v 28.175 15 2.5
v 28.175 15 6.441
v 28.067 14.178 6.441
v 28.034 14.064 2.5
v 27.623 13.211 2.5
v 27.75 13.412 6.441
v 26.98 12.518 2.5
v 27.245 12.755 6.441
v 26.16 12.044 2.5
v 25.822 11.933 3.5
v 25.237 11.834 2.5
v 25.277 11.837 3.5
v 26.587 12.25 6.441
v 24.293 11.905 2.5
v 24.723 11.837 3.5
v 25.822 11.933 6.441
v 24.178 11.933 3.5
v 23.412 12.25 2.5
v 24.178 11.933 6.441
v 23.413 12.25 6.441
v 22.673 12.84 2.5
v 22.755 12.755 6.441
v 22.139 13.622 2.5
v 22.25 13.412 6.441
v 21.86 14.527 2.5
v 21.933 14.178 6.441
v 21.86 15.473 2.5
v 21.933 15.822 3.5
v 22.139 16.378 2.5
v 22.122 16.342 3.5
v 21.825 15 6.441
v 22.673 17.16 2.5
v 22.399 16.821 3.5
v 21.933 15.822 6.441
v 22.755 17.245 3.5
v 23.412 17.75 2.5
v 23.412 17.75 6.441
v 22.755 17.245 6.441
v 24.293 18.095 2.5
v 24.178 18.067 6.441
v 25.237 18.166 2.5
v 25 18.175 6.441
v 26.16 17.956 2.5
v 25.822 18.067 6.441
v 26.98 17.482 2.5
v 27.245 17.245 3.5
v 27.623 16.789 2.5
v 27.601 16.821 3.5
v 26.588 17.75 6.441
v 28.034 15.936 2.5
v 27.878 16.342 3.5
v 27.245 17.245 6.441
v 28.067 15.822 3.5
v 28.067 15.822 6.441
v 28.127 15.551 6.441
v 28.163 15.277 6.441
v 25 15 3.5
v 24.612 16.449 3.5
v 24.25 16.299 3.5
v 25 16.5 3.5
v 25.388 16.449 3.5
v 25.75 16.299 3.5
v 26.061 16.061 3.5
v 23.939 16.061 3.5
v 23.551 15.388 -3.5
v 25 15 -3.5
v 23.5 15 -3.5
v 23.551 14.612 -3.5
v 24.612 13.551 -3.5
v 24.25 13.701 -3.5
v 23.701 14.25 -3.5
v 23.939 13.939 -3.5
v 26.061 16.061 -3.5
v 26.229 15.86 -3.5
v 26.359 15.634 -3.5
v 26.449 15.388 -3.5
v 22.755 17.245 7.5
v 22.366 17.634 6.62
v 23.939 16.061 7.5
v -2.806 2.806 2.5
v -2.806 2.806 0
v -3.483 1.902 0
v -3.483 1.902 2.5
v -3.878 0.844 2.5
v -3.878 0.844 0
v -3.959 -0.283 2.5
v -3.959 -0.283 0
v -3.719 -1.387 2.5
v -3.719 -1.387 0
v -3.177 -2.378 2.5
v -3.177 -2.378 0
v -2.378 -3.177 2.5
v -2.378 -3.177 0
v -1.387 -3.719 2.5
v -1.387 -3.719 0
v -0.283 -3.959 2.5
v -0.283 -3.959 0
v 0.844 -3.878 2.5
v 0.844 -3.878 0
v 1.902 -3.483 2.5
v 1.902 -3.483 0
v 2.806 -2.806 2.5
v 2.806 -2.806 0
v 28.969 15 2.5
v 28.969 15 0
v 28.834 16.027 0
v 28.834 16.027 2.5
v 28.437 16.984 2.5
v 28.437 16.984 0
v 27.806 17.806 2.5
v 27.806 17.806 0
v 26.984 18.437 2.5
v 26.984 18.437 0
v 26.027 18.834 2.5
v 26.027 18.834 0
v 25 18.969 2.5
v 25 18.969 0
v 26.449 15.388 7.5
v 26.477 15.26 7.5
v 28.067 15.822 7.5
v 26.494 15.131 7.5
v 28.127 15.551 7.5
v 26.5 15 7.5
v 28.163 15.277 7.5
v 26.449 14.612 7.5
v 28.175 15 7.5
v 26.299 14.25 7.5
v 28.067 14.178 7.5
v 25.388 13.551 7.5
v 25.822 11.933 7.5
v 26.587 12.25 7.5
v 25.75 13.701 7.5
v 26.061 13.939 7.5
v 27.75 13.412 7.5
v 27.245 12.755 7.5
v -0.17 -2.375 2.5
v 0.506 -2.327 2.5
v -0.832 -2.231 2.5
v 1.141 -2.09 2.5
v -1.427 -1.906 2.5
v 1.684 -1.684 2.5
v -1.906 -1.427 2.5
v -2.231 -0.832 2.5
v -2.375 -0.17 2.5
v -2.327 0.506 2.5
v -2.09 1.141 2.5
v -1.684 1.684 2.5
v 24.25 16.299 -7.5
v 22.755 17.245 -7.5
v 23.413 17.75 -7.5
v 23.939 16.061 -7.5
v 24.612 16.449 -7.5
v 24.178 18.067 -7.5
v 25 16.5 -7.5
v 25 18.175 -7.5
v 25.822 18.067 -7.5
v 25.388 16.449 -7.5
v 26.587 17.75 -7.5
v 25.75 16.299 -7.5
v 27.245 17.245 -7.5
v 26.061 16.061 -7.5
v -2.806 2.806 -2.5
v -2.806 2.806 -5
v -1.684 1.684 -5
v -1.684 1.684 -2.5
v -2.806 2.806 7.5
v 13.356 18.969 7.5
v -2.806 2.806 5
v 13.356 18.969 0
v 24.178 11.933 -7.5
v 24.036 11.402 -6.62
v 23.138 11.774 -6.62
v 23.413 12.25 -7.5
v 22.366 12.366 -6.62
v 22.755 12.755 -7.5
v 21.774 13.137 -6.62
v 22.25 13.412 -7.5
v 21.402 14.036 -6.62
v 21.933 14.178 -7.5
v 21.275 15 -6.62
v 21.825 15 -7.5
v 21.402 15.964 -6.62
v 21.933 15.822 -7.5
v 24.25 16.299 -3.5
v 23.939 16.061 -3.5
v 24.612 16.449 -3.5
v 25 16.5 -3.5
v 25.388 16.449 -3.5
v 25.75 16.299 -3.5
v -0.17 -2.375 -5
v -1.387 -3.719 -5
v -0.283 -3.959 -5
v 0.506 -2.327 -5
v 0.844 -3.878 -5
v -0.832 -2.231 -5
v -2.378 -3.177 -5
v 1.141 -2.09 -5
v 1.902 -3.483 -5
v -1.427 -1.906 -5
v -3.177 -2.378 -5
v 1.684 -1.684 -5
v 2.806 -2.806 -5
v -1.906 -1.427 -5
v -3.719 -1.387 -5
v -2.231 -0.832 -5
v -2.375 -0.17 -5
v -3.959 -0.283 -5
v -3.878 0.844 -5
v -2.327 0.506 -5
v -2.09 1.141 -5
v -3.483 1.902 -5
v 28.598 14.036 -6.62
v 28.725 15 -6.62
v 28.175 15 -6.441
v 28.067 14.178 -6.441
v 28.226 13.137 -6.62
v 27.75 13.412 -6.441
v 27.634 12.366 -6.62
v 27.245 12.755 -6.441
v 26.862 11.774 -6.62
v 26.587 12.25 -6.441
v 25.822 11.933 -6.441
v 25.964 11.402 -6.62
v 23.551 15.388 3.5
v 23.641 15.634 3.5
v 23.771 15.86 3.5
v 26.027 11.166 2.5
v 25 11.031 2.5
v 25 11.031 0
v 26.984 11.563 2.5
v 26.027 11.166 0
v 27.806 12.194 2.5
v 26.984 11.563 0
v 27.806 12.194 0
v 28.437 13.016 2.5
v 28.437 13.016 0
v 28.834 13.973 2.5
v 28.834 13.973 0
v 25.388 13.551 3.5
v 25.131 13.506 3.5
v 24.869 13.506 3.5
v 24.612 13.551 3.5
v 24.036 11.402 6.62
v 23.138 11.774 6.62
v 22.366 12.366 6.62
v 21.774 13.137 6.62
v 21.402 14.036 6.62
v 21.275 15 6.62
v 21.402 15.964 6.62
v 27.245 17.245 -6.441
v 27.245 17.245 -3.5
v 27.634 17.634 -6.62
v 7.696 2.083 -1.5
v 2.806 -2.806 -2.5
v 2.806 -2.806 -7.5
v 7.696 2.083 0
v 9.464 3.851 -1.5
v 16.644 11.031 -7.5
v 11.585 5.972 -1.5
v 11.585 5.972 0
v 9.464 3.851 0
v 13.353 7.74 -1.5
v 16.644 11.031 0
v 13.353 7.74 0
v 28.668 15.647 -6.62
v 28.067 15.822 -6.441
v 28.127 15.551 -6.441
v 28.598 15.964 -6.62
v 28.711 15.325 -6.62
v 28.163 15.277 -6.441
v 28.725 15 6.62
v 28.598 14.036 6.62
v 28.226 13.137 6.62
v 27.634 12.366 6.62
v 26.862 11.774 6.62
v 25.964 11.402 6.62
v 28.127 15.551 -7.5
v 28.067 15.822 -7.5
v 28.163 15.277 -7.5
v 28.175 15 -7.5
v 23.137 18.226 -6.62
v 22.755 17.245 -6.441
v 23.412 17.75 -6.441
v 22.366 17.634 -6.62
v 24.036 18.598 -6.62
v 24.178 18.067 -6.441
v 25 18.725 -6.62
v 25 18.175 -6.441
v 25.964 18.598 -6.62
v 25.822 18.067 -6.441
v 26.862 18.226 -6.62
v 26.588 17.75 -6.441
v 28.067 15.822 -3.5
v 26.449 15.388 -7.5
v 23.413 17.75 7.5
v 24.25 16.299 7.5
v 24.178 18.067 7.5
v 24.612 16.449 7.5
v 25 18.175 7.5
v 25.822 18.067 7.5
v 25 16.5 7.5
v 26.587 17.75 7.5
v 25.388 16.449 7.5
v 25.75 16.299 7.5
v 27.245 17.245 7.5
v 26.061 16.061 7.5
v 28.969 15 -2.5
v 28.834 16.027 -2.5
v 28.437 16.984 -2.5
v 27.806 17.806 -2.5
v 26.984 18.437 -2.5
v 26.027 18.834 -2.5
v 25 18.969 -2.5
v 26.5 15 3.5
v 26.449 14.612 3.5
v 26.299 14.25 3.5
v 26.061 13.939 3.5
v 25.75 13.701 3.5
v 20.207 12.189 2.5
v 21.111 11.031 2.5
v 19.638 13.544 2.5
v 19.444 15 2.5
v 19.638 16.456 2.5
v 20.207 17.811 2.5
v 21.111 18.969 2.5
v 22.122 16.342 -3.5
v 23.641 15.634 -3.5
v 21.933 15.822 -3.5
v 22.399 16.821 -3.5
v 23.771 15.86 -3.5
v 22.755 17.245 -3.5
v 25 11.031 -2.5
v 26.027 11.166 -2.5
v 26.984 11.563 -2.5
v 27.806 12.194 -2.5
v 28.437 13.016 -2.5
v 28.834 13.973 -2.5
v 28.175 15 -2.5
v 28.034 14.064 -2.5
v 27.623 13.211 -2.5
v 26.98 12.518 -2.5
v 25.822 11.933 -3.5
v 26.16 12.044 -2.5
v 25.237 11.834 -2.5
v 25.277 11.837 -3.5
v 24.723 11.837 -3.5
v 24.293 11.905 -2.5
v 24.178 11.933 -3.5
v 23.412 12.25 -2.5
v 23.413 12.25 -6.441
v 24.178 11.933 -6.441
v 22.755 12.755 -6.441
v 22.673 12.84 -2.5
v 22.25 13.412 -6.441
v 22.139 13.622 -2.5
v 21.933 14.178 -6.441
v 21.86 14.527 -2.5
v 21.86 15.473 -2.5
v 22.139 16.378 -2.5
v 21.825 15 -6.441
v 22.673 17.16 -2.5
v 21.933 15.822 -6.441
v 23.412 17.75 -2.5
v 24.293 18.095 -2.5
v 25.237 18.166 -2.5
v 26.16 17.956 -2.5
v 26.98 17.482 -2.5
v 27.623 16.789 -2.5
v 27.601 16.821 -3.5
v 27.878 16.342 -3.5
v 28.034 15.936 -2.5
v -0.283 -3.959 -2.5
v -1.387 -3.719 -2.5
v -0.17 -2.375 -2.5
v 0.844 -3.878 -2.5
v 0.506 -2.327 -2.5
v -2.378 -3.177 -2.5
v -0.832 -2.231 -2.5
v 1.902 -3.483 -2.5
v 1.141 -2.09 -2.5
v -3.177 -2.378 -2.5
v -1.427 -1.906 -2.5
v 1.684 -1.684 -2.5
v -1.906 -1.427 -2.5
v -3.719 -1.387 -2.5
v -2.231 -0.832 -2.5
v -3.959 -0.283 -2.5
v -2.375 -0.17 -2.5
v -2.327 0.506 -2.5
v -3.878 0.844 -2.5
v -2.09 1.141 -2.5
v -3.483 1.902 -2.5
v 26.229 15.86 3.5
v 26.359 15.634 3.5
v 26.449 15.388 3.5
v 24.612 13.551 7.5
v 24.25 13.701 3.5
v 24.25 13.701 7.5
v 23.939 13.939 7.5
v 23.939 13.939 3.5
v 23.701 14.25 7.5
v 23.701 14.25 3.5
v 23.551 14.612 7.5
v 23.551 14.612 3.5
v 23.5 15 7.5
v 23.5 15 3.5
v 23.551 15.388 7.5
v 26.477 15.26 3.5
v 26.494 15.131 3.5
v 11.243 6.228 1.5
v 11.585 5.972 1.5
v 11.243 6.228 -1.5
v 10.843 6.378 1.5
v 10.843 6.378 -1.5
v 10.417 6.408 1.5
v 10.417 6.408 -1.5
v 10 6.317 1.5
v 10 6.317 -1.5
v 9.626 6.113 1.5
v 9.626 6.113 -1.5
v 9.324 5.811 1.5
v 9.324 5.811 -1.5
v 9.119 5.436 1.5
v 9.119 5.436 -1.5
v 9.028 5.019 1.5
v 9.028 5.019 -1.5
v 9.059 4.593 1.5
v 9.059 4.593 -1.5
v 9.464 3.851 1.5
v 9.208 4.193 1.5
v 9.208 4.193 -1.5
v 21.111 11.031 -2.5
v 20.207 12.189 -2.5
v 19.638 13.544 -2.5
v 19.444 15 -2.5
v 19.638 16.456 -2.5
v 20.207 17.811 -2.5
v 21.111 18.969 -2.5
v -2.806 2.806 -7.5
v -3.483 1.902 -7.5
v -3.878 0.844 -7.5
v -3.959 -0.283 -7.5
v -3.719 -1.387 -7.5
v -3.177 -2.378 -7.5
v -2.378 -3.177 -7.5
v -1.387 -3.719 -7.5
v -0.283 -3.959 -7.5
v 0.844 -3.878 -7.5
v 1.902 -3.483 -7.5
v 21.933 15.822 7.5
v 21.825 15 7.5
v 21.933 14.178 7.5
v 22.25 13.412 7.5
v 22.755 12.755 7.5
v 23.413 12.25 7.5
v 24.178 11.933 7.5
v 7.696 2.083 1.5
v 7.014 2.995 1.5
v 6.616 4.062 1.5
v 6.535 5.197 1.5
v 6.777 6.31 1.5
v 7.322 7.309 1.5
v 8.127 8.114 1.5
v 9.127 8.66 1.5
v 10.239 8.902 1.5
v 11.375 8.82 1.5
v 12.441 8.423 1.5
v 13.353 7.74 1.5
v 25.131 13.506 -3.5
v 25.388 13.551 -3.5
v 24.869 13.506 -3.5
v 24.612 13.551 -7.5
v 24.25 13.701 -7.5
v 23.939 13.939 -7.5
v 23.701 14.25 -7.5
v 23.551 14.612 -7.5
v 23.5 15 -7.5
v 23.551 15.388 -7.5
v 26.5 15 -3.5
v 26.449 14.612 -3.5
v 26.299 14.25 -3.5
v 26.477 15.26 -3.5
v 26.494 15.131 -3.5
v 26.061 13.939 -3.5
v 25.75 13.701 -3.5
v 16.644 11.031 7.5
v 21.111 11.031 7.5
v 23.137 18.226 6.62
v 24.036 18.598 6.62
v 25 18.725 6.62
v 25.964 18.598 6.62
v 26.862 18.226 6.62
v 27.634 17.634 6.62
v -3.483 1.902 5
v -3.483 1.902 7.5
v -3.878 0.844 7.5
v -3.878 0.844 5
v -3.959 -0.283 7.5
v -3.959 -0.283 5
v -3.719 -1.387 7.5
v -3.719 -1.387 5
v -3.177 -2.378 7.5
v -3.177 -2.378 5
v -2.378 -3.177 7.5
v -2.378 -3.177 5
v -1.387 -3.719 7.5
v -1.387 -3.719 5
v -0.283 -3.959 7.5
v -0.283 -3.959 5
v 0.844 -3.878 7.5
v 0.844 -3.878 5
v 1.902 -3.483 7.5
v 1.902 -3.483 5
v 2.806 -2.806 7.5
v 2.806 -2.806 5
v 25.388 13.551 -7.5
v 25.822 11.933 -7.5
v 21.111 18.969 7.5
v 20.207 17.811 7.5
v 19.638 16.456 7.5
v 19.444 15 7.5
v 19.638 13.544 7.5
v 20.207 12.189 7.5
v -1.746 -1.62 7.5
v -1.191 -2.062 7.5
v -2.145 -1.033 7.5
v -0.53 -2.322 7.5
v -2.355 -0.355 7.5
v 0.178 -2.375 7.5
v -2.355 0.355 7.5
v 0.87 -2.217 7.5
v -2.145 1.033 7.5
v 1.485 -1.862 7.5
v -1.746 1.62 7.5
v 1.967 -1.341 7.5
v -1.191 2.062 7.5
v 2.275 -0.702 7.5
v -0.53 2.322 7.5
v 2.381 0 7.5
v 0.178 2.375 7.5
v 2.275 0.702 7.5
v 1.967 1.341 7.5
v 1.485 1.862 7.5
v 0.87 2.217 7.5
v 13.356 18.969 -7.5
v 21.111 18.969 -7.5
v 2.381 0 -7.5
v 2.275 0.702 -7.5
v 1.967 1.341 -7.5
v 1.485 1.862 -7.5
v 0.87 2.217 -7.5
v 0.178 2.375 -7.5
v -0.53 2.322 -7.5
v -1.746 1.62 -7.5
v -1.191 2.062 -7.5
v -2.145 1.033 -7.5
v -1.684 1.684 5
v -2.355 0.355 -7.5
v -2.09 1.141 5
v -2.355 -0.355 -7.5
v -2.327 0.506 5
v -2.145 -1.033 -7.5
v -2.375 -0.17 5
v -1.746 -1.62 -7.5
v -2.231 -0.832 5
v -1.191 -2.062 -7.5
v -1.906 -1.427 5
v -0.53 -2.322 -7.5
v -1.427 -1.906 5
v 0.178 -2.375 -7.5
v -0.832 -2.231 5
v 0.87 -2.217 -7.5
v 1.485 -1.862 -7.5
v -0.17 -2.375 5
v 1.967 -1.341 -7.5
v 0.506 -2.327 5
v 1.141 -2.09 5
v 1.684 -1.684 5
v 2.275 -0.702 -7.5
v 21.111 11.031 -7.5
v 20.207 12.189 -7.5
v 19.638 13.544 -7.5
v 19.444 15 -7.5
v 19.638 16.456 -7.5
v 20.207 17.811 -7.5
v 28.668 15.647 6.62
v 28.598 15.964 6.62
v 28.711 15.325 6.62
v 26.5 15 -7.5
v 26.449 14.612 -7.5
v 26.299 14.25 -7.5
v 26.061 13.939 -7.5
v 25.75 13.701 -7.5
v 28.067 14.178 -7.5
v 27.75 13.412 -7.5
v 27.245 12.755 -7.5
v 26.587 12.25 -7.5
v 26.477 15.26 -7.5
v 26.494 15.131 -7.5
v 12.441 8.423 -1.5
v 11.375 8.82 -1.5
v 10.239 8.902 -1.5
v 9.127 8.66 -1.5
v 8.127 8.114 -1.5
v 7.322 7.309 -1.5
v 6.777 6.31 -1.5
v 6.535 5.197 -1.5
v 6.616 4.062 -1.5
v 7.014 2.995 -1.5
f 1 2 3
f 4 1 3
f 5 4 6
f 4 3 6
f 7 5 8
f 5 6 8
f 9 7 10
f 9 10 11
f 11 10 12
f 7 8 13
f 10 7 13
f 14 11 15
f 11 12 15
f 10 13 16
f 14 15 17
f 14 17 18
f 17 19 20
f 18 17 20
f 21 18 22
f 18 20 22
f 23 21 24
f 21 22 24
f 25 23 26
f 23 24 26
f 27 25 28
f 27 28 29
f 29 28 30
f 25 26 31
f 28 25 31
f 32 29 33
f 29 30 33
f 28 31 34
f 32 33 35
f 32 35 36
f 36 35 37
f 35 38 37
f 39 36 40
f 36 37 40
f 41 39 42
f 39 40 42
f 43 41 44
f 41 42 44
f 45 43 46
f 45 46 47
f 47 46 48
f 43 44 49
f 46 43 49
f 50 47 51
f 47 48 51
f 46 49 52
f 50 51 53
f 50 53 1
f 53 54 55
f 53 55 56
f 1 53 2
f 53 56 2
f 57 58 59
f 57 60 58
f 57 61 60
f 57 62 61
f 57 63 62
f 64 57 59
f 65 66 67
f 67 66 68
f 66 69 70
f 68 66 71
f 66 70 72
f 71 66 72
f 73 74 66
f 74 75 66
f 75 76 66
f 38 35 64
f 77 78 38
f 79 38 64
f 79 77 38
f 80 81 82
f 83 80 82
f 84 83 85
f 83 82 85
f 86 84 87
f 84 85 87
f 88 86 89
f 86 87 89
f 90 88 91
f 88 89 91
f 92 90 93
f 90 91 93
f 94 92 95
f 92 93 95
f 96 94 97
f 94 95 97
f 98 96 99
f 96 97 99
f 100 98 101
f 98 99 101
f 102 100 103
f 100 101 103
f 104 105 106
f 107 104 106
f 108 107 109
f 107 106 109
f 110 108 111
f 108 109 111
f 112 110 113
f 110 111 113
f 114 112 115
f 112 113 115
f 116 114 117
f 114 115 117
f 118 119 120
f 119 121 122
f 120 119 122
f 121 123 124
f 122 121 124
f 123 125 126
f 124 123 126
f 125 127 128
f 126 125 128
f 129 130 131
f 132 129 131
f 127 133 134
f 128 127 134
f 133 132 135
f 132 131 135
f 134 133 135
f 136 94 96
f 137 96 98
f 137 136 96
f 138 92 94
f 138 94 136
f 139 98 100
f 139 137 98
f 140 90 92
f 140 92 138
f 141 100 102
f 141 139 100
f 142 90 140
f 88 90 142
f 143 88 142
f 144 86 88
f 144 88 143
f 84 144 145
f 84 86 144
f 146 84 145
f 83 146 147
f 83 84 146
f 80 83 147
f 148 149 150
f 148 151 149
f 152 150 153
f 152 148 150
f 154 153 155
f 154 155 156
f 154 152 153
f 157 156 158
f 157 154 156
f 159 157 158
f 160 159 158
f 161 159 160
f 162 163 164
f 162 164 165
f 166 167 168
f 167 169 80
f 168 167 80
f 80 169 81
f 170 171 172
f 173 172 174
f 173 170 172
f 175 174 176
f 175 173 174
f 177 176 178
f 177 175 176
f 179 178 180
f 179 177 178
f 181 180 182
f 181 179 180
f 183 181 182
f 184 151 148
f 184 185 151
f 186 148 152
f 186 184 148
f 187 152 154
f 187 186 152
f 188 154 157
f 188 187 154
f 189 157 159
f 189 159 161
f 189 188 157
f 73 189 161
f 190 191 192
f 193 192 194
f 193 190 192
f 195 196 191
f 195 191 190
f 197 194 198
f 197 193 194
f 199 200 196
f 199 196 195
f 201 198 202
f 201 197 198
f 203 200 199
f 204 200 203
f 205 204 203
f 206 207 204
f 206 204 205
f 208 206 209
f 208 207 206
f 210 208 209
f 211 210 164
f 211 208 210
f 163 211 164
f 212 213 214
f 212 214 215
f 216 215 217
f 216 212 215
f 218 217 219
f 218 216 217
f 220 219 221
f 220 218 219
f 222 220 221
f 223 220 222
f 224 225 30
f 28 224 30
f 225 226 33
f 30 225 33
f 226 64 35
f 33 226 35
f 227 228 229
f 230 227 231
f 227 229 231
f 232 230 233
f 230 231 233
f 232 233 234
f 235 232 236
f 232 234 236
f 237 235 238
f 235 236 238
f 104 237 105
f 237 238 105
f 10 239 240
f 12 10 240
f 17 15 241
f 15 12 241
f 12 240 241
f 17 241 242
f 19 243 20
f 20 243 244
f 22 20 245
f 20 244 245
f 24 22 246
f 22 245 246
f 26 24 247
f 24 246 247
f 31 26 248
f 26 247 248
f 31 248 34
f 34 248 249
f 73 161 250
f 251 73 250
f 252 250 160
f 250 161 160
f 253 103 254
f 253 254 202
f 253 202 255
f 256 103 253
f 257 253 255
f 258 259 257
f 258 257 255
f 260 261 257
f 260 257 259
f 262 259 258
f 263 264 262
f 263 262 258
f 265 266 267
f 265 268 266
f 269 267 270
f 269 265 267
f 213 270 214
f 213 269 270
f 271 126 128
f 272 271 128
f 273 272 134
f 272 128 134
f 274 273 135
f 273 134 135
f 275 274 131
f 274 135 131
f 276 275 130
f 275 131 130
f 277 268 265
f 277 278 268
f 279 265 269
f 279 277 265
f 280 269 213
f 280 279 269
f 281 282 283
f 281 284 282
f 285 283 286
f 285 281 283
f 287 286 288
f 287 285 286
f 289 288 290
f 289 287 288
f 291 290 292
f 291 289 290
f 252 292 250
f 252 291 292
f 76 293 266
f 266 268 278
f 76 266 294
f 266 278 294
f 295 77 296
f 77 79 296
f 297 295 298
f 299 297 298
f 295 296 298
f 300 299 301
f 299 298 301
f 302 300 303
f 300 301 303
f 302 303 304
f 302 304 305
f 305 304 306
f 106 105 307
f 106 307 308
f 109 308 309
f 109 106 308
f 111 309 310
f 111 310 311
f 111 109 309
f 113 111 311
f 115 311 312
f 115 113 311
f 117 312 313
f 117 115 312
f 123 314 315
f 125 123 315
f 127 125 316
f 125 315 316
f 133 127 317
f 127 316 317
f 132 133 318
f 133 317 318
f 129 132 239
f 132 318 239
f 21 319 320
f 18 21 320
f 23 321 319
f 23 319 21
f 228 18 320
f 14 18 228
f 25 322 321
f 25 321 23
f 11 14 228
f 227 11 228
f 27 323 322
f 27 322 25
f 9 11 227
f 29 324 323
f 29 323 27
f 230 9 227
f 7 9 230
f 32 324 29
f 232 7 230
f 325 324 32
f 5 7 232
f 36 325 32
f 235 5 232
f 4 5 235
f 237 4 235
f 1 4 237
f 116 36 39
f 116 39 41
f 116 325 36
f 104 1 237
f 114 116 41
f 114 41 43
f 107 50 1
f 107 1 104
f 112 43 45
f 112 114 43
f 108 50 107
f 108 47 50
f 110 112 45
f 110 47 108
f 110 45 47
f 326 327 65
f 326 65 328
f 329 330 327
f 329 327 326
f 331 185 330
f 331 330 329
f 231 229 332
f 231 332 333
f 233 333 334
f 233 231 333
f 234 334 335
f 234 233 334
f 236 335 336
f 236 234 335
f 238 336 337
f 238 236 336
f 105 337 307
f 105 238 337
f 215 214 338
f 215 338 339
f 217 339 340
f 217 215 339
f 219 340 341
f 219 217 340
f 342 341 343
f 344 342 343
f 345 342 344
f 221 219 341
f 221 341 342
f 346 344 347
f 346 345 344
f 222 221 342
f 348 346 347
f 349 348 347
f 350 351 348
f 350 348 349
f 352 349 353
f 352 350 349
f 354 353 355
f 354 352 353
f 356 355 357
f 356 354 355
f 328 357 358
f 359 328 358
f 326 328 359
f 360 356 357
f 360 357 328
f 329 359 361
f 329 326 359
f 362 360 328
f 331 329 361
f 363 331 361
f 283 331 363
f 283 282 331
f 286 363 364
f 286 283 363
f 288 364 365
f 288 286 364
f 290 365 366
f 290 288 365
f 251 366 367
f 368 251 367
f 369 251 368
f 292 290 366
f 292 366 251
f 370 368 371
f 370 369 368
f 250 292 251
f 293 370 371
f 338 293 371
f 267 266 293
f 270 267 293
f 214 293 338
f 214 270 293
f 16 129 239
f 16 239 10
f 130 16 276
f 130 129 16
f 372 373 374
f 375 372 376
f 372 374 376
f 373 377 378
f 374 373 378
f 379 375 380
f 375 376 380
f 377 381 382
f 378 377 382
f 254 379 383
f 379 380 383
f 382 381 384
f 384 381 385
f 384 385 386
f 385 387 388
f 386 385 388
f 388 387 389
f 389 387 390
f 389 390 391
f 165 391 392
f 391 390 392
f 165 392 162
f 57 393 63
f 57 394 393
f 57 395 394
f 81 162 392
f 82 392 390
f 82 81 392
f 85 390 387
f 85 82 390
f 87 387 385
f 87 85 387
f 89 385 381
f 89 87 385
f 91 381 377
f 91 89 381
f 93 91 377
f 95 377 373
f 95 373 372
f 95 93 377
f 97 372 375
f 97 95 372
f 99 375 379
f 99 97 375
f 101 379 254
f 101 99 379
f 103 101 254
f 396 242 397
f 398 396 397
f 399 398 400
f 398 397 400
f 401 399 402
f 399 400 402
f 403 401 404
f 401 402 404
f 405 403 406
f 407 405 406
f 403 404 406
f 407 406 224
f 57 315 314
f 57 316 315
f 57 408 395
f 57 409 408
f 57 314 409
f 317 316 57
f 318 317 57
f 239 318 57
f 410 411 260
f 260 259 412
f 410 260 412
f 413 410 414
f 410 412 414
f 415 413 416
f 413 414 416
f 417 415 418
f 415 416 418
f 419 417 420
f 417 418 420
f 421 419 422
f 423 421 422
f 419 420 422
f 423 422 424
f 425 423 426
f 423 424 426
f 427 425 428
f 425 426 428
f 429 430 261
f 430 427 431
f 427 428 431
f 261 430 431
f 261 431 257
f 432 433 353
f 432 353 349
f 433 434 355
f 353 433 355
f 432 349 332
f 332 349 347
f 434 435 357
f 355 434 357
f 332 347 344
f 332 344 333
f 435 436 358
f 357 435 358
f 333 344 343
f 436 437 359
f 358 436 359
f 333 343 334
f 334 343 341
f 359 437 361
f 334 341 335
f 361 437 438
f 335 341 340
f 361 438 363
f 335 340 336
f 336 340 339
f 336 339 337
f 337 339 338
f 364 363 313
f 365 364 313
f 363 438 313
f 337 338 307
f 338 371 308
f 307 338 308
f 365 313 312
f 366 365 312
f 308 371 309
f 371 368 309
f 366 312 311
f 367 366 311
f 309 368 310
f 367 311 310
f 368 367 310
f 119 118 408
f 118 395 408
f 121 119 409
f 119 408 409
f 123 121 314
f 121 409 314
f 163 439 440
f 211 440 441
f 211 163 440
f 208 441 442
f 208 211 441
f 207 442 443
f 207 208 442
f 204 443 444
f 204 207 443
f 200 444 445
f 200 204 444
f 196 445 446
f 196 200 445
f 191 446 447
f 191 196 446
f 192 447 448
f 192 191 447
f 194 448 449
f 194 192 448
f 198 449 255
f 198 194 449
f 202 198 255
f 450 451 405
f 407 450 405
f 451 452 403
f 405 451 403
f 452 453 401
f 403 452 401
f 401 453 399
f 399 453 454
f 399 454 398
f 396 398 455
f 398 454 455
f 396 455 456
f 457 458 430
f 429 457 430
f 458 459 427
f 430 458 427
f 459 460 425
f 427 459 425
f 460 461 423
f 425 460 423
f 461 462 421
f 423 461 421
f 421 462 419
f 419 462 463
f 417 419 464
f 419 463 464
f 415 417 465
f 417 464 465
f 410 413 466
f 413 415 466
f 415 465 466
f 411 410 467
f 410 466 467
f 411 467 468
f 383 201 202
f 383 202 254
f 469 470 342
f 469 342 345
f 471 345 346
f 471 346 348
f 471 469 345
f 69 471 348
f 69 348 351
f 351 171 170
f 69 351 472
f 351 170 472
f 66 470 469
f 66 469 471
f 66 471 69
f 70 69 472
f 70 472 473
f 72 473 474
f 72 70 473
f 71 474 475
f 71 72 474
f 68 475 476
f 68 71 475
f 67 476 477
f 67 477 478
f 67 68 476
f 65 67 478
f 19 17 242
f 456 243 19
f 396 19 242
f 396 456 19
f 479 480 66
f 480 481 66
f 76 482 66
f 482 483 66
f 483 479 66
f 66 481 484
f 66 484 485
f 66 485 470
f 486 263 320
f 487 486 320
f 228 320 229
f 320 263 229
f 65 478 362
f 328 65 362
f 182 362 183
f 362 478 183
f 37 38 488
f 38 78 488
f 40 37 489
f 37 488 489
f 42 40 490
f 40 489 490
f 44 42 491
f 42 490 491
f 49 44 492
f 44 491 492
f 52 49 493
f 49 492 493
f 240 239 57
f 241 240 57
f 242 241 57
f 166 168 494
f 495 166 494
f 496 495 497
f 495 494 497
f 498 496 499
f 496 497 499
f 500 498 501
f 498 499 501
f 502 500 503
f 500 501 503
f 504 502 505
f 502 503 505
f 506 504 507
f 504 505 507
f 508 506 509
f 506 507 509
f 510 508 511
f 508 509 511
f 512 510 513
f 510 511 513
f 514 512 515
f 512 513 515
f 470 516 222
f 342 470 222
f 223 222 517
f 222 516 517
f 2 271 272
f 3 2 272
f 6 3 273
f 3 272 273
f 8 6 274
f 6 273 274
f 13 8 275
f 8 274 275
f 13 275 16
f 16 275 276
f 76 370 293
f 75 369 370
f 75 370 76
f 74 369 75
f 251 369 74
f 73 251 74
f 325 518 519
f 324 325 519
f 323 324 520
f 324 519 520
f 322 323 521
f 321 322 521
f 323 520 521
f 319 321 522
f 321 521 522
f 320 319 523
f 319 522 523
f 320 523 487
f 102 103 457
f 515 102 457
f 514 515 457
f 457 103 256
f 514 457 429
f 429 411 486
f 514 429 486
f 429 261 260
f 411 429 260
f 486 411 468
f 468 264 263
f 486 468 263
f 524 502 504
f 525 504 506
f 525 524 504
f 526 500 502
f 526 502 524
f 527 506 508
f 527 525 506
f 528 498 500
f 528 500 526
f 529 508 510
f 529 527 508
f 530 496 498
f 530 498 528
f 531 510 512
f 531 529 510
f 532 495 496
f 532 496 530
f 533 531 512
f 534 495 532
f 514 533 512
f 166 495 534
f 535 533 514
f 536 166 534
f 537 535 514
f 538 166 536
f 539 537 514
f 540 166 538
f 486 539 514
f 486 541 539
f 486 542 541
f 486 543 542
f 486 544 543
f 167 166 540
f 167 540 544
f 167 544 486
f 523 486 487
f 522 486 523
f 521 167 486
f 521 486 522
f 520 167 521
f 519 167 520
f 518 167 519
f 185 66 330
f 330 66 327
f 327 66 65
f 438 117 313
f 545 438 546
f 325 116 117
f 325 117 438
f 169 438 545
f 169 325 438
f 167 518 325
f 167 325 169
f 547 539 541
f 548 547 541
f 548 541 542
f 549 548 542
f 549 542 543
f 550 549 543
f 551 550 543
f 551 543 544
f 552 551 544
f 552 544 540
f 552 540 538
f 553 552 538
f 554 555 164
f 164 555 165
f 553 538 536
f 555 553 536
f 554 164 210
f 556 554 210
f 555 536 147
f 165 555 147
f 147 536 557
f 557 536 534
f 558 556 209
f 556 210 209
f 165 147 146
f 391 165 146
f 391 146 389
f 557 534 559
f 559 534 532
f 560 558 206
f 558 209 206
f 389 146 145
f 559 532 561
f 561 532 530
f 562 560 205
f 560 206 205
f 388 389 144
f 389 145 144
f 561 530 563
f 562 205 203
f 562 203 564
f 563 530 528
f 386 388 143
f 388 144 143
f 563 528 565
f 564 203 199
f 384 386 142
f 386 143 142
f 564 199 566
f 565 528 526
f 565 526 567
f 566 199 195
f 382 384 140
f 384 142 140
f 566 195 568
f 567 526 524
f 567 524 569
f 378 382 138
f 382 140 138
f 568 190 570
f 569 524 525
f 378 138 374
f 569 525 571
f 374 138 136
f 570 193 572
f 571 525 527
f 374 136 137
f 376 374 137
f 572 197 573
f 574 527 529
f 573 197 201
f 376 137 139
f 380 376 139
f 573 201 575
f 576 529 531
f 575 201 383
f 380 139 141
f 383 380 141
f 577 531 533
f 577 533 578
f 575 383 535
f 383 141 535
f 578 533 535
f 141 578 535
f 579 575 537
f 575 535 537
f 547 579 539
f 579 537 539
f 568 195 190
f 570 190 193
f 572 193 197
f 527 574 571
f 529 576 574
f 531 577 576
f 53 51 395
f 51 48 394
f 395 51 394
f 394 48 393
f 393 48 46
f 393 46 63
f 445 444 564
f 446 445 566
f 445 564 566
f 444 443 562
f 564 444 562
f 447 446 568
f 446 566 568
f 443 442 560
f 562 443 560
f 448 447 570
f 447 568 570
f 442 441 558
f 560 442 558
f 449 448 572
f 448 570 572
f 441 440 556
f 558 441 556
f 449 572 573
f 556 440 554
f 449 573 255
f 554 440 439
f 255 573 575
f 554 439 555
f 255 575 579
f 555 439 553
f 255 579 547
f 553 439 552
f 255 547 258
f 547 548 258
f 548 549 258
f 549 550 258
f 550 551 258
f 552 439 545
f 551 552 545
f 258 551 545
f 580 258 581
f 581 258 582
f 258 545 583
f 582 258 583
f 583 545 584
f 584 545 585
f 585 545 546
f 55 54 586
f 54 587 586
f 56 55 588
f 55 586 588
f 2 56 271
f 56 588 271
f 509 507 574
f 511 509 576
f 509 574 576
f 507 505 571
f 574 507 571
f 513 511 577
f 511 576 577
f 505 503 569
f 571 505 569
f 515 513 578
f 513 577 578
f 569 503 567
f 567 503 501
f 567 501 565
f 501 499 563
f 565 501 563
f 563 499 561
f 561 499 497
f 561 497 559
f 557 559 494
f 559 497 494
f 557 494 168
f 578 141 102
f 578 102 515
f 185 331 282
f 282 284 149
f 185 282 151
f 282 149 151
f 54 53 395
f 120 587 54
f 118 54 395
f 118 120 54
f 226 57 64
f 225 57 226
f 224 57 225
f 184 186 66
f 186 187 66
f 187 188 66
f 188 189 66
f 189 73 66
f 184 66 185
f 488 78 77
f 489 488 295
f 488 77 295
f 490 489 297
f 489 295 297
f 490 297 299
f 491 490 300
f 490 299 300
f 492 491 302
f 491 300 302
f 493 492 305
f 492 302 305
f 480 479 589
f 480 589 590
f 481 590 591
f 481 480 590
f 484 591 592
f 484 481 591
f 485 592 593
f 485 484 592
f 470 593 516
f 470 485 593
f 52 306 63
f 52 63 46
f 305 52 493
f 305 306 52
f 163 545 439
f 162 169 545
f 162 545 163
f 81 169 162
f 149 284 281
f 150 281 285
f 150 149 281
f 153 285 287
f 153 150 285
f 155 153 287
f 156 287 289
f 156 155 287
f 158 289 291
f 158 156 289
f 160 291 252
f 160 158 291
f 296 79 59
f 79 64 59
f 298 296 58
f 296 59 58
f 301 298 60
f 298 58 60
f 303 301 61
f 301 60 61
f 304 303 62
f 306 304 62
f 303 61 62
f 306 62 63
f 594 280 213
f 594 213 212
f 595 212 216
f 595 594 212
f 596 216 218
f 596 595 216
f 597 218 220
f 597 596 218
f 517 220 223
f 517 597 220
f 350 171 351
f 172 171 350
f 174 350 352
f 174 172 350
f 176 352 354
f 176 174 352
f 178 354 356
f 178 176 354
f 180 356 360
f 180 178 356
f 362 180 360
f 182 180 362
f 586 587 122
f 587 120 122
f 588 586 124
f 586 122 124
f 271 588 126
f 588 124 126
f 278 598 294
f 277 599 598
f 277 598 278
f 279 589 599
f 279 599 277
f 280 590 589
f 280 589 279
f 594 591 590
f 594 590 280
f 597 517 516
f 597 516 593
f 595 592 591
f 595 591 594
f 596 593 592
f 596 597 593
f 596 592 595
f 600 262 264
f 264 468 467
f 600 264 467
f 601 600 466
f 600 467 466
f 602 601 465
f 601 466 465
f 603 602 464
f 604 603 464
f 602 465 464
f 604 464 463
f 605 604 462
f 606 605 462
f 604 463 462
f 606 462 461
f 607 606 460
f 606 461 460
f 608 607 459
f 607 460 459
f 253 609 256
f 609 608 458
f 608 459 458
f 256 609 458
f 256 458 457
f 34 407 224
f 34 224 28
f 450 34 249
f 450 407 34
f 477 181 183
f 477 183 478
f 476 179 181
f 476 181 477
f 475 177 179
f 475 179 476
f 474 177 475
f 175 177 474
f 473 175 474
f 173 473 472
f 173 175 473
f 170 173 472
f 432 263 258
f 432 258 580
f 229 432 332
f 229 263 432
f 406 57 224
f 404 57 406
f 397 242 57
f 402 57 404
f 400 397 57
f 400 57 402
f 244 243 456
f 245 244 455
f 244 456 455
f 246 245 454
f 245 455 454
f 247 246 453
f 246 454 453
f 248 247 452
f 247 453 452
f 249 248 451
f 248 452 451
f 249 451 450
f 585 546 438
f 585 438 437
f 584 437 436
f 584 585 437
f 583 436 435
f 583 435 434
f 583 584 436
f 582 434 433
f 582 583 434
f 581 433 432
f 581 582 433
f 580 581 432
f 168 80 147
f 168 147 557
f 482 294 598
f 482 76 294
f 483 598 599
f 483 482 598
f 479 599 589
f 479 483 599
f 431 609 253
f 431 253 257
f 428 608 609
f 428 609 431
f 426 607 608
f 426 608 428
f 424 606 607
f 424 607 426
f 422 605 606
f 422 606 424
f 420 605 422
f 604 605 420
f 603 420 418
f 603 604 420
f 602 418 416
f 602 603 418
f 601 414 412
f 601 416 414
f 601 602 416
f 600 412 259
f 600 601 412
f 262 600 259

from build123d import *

# Parameters (mm, degrees)
CROQUIS1_R              = 3.96875
SALIENTE_EXTRUIR1_DEPTH = 7.5
CROQUIS2_W              = 2.5
CROQUIS2_H              = 3.96875
CORTAR_EXTRUIR1_DEPTH   = 15
CROQUIS4_R              = 2.38125
CORTAR_EXTRUIR2_DEPTH   = 15
CROQUIS5_R              = 5.55625
CORTAR_EXTRUIR3_DEPTH   = 5
CROQUIS8_W              = 1
CROQUIS8_H              = 1.5
CORTAR_EXTRUIR6_DEPTH   = 4
CROQUIS10_R             = 4
CROQUIS10_R_2           = 1.5
CORTAR_EXTRUIR7_DEPTH   = 1.5


with BuildPart() as part:
    # Croquis1 → Saliente-Extruir1 (new, symmetric)
    with BuildSketch(Plane.XY):
        Circle(CROQUIS1_R)
        with BuildLine():
            Line((13.356089924, 18.96875), (-2.806330038, 2.806330038))
            ThreePointArc((-2.806330038, 2.806330038), (1.518774872, 3.666646895), (3.96875, 0))
            ThreePointArc((3.96875, 0), (3.666646895, -1.518774872), (2.806330038, -2.806330038))
            Line((2.806330038, -2.806330038), (16.643910076, 11.03125))
            Line((16.643910076, 11.03125), (25, 11.03125))
            ThreePointArc((25, 11.03125), (21.03125, 15), (25, 18.96875))
            Line((25, 18.96875), (13.356089924, 18.96875))
        make_face()
        with BuildLine():
            ThreePointArc((28.96875, 15), (27.806330038, 17.806330038), (25, 18.96875))
            Line((25, 18.96875), (25, 11.03125))
            ThreePointArc((25, 11.03125), (27.806330038, 12.193669962), (28.96875, 15))
        make_face()
        with BuildLine():
            Line((25, 11.03125), (25, 18.96875))
            ThreePointArc((25, 18.96875), (21.03125, 15), (25, 11.03125))
        make_face()
        with BuildLine():
            ThreePointArc((28.96875, 15), (27.806330038, 17.806330038), (25, 18.96875))
            Line((25, 18.96875), (25, 11.03125))
            ThreePointArc((25, 11.03125), (27.806330038, 12.193669962), (28.96875, 15))
        make_face()
        with BuildLine():
            Line((25, 11.03125), (25, 18.96875))
            ThreePointArc((25, 18.96875), (21.03125, 15), (25, 11.03125))
        make_face()
    extrude(amount=SALIENTE_EXTRUIR1_DEPTH, both=True)

    # Croquis2 → Cortar-Extruir1 (cut)
    with BuildSketch(Plane(origin=(-2.806330038, 2.806330038, 0), x_dir=(0, 0, 1), z_dir=(-0.7071067811865441, 0.7071067811865509, 0))):
        with Locations((-3.75, -1.984375)):
            Rectangle(CROQUIS2_W, CROQUIS2_H)
        with Locations((3.75, -1.984375)):
            Rectangle(CROQUIS2_W, CROQUIS2_H)
    extrude(amount=-CORTAR_EXTRUIR1_DEPTH, mode=Mode.SUBTRACT)

    # Croquis4 → Cortar-Extruir2 (cut)
    with BuildSketch(Plane.XY.offset(7.5)):
        Circle(CROQUIS4_R)
    extrude(amount=-CORTAR_EXTRUIR2_DEPTH, mode=Mode.SUBTRACT)

    # Croquis5 → Cortar-Extruir3 (cut)
    with BuildSketch(Plane.XY.offset(7.5)):
        with Locations((25, 15)):
            Circle(CROQUIS5_R)
    cortar_extruir3 = extrude(amount=-CORTAR_EXTRUIR3_DEPTH, mode=Mode.SUBTRACT)

    # Simetría1: Cortar-Extruir3 across plane
    add(cortar_extruir3.mirror(Plane.XY), mode=Mode.SUBTRACT)

    # Croquis8 → Revolución1 (revolve)
    with BuildSketch(Plane(origin=(25, 0, 0), x_dir=(0, 0, -1), z_dir=(1, 0, 0)), mode=Mode.PRIVATE) as revoluci_n1_sk:
        Polygon((7.5, 18.175), (7.5, 16.5), (2.5, 16.5), (2.5, 18.175), (6.441294167, 18.175), (6.62, 18.725), align=None)
        with Locations((3, 15.75)):
            Rectangle(CROQUIS8_W, CROQUIS8_H)
    revoluci_n1 = revolve(revoluci_n1_sk.sketch.rotate(Axis((25, 15, -2.5), (0, 0, -1)), 90), axis=Axis((25, 15, -2.5), (0, 0, -1)))

    # Croquis9 → Cortar-Extruir6 (cut)
    with BuildSketch(Plane(origin=(0, 0, -7.5), x_dir=(-1, 0, 0), z_dir=(0, 0, -1))):
        with BuildLine():
            Line((-23.777080012, 10.436000471), (-25, 15))
            Line((-25, 15), (-26.222919988, 10.436000471))
            ThreePointArc((-26.222919988, 10.436000471), (-25, 10.275), (-23.777080012, 10.436000471))
        make_face()
        with BuildLine():
            Line((-29.563999529, 16.222919988), (-25, 15))
            Line((-25, 15), (-28.341079541, 18.341079541))
            ThreePointArc((-28.341079541, 18.341079541), (-29.091970033, 17.3625), (-29.563999529, 16.222919988))
        make_face()
        with BuildLine():
            Line((-21.658920459, 18.341079541), (-25, 15))
            Line((-25, 15), (-20.436000471, 16.222919988))
            ThreePointArc((-20.436000471, 16.222919988), (-20.908029967, 17.3625), (-21.658920459, 18.341079541))
        make_face()
    cortar_extruir6 = extrude(amount=-CORTAR_EXTRUIR6_DEPTH, mode=Mode.SUBTRACT)

    # Simetría2: Revolución1, Cortar-Extruir6 across plane
    add(revoluci_n1.mirror(Plane.XY))
    add(cortar_extruir6.mirror(Plane.XY), mode=Mode.SUBTRACT)

    # Croquis10 → Cortar-Extruir7 (cut, symmetric)
    with BuildSketch(Plane.XY):
        with Locations((10.52444577, 4.911785694)):
            Circle(CROQUIS10_R)
        with Locations((10.52444577, 4.911785694)):
            Circle(CROQUIS10_R_2, mode=Mode.SUBTRACT)
    extrude(amount=CORTAR_EXTRUIR7_DEPTH, both=True, mode=Mode.SUBTRACT)


solid = part.part
